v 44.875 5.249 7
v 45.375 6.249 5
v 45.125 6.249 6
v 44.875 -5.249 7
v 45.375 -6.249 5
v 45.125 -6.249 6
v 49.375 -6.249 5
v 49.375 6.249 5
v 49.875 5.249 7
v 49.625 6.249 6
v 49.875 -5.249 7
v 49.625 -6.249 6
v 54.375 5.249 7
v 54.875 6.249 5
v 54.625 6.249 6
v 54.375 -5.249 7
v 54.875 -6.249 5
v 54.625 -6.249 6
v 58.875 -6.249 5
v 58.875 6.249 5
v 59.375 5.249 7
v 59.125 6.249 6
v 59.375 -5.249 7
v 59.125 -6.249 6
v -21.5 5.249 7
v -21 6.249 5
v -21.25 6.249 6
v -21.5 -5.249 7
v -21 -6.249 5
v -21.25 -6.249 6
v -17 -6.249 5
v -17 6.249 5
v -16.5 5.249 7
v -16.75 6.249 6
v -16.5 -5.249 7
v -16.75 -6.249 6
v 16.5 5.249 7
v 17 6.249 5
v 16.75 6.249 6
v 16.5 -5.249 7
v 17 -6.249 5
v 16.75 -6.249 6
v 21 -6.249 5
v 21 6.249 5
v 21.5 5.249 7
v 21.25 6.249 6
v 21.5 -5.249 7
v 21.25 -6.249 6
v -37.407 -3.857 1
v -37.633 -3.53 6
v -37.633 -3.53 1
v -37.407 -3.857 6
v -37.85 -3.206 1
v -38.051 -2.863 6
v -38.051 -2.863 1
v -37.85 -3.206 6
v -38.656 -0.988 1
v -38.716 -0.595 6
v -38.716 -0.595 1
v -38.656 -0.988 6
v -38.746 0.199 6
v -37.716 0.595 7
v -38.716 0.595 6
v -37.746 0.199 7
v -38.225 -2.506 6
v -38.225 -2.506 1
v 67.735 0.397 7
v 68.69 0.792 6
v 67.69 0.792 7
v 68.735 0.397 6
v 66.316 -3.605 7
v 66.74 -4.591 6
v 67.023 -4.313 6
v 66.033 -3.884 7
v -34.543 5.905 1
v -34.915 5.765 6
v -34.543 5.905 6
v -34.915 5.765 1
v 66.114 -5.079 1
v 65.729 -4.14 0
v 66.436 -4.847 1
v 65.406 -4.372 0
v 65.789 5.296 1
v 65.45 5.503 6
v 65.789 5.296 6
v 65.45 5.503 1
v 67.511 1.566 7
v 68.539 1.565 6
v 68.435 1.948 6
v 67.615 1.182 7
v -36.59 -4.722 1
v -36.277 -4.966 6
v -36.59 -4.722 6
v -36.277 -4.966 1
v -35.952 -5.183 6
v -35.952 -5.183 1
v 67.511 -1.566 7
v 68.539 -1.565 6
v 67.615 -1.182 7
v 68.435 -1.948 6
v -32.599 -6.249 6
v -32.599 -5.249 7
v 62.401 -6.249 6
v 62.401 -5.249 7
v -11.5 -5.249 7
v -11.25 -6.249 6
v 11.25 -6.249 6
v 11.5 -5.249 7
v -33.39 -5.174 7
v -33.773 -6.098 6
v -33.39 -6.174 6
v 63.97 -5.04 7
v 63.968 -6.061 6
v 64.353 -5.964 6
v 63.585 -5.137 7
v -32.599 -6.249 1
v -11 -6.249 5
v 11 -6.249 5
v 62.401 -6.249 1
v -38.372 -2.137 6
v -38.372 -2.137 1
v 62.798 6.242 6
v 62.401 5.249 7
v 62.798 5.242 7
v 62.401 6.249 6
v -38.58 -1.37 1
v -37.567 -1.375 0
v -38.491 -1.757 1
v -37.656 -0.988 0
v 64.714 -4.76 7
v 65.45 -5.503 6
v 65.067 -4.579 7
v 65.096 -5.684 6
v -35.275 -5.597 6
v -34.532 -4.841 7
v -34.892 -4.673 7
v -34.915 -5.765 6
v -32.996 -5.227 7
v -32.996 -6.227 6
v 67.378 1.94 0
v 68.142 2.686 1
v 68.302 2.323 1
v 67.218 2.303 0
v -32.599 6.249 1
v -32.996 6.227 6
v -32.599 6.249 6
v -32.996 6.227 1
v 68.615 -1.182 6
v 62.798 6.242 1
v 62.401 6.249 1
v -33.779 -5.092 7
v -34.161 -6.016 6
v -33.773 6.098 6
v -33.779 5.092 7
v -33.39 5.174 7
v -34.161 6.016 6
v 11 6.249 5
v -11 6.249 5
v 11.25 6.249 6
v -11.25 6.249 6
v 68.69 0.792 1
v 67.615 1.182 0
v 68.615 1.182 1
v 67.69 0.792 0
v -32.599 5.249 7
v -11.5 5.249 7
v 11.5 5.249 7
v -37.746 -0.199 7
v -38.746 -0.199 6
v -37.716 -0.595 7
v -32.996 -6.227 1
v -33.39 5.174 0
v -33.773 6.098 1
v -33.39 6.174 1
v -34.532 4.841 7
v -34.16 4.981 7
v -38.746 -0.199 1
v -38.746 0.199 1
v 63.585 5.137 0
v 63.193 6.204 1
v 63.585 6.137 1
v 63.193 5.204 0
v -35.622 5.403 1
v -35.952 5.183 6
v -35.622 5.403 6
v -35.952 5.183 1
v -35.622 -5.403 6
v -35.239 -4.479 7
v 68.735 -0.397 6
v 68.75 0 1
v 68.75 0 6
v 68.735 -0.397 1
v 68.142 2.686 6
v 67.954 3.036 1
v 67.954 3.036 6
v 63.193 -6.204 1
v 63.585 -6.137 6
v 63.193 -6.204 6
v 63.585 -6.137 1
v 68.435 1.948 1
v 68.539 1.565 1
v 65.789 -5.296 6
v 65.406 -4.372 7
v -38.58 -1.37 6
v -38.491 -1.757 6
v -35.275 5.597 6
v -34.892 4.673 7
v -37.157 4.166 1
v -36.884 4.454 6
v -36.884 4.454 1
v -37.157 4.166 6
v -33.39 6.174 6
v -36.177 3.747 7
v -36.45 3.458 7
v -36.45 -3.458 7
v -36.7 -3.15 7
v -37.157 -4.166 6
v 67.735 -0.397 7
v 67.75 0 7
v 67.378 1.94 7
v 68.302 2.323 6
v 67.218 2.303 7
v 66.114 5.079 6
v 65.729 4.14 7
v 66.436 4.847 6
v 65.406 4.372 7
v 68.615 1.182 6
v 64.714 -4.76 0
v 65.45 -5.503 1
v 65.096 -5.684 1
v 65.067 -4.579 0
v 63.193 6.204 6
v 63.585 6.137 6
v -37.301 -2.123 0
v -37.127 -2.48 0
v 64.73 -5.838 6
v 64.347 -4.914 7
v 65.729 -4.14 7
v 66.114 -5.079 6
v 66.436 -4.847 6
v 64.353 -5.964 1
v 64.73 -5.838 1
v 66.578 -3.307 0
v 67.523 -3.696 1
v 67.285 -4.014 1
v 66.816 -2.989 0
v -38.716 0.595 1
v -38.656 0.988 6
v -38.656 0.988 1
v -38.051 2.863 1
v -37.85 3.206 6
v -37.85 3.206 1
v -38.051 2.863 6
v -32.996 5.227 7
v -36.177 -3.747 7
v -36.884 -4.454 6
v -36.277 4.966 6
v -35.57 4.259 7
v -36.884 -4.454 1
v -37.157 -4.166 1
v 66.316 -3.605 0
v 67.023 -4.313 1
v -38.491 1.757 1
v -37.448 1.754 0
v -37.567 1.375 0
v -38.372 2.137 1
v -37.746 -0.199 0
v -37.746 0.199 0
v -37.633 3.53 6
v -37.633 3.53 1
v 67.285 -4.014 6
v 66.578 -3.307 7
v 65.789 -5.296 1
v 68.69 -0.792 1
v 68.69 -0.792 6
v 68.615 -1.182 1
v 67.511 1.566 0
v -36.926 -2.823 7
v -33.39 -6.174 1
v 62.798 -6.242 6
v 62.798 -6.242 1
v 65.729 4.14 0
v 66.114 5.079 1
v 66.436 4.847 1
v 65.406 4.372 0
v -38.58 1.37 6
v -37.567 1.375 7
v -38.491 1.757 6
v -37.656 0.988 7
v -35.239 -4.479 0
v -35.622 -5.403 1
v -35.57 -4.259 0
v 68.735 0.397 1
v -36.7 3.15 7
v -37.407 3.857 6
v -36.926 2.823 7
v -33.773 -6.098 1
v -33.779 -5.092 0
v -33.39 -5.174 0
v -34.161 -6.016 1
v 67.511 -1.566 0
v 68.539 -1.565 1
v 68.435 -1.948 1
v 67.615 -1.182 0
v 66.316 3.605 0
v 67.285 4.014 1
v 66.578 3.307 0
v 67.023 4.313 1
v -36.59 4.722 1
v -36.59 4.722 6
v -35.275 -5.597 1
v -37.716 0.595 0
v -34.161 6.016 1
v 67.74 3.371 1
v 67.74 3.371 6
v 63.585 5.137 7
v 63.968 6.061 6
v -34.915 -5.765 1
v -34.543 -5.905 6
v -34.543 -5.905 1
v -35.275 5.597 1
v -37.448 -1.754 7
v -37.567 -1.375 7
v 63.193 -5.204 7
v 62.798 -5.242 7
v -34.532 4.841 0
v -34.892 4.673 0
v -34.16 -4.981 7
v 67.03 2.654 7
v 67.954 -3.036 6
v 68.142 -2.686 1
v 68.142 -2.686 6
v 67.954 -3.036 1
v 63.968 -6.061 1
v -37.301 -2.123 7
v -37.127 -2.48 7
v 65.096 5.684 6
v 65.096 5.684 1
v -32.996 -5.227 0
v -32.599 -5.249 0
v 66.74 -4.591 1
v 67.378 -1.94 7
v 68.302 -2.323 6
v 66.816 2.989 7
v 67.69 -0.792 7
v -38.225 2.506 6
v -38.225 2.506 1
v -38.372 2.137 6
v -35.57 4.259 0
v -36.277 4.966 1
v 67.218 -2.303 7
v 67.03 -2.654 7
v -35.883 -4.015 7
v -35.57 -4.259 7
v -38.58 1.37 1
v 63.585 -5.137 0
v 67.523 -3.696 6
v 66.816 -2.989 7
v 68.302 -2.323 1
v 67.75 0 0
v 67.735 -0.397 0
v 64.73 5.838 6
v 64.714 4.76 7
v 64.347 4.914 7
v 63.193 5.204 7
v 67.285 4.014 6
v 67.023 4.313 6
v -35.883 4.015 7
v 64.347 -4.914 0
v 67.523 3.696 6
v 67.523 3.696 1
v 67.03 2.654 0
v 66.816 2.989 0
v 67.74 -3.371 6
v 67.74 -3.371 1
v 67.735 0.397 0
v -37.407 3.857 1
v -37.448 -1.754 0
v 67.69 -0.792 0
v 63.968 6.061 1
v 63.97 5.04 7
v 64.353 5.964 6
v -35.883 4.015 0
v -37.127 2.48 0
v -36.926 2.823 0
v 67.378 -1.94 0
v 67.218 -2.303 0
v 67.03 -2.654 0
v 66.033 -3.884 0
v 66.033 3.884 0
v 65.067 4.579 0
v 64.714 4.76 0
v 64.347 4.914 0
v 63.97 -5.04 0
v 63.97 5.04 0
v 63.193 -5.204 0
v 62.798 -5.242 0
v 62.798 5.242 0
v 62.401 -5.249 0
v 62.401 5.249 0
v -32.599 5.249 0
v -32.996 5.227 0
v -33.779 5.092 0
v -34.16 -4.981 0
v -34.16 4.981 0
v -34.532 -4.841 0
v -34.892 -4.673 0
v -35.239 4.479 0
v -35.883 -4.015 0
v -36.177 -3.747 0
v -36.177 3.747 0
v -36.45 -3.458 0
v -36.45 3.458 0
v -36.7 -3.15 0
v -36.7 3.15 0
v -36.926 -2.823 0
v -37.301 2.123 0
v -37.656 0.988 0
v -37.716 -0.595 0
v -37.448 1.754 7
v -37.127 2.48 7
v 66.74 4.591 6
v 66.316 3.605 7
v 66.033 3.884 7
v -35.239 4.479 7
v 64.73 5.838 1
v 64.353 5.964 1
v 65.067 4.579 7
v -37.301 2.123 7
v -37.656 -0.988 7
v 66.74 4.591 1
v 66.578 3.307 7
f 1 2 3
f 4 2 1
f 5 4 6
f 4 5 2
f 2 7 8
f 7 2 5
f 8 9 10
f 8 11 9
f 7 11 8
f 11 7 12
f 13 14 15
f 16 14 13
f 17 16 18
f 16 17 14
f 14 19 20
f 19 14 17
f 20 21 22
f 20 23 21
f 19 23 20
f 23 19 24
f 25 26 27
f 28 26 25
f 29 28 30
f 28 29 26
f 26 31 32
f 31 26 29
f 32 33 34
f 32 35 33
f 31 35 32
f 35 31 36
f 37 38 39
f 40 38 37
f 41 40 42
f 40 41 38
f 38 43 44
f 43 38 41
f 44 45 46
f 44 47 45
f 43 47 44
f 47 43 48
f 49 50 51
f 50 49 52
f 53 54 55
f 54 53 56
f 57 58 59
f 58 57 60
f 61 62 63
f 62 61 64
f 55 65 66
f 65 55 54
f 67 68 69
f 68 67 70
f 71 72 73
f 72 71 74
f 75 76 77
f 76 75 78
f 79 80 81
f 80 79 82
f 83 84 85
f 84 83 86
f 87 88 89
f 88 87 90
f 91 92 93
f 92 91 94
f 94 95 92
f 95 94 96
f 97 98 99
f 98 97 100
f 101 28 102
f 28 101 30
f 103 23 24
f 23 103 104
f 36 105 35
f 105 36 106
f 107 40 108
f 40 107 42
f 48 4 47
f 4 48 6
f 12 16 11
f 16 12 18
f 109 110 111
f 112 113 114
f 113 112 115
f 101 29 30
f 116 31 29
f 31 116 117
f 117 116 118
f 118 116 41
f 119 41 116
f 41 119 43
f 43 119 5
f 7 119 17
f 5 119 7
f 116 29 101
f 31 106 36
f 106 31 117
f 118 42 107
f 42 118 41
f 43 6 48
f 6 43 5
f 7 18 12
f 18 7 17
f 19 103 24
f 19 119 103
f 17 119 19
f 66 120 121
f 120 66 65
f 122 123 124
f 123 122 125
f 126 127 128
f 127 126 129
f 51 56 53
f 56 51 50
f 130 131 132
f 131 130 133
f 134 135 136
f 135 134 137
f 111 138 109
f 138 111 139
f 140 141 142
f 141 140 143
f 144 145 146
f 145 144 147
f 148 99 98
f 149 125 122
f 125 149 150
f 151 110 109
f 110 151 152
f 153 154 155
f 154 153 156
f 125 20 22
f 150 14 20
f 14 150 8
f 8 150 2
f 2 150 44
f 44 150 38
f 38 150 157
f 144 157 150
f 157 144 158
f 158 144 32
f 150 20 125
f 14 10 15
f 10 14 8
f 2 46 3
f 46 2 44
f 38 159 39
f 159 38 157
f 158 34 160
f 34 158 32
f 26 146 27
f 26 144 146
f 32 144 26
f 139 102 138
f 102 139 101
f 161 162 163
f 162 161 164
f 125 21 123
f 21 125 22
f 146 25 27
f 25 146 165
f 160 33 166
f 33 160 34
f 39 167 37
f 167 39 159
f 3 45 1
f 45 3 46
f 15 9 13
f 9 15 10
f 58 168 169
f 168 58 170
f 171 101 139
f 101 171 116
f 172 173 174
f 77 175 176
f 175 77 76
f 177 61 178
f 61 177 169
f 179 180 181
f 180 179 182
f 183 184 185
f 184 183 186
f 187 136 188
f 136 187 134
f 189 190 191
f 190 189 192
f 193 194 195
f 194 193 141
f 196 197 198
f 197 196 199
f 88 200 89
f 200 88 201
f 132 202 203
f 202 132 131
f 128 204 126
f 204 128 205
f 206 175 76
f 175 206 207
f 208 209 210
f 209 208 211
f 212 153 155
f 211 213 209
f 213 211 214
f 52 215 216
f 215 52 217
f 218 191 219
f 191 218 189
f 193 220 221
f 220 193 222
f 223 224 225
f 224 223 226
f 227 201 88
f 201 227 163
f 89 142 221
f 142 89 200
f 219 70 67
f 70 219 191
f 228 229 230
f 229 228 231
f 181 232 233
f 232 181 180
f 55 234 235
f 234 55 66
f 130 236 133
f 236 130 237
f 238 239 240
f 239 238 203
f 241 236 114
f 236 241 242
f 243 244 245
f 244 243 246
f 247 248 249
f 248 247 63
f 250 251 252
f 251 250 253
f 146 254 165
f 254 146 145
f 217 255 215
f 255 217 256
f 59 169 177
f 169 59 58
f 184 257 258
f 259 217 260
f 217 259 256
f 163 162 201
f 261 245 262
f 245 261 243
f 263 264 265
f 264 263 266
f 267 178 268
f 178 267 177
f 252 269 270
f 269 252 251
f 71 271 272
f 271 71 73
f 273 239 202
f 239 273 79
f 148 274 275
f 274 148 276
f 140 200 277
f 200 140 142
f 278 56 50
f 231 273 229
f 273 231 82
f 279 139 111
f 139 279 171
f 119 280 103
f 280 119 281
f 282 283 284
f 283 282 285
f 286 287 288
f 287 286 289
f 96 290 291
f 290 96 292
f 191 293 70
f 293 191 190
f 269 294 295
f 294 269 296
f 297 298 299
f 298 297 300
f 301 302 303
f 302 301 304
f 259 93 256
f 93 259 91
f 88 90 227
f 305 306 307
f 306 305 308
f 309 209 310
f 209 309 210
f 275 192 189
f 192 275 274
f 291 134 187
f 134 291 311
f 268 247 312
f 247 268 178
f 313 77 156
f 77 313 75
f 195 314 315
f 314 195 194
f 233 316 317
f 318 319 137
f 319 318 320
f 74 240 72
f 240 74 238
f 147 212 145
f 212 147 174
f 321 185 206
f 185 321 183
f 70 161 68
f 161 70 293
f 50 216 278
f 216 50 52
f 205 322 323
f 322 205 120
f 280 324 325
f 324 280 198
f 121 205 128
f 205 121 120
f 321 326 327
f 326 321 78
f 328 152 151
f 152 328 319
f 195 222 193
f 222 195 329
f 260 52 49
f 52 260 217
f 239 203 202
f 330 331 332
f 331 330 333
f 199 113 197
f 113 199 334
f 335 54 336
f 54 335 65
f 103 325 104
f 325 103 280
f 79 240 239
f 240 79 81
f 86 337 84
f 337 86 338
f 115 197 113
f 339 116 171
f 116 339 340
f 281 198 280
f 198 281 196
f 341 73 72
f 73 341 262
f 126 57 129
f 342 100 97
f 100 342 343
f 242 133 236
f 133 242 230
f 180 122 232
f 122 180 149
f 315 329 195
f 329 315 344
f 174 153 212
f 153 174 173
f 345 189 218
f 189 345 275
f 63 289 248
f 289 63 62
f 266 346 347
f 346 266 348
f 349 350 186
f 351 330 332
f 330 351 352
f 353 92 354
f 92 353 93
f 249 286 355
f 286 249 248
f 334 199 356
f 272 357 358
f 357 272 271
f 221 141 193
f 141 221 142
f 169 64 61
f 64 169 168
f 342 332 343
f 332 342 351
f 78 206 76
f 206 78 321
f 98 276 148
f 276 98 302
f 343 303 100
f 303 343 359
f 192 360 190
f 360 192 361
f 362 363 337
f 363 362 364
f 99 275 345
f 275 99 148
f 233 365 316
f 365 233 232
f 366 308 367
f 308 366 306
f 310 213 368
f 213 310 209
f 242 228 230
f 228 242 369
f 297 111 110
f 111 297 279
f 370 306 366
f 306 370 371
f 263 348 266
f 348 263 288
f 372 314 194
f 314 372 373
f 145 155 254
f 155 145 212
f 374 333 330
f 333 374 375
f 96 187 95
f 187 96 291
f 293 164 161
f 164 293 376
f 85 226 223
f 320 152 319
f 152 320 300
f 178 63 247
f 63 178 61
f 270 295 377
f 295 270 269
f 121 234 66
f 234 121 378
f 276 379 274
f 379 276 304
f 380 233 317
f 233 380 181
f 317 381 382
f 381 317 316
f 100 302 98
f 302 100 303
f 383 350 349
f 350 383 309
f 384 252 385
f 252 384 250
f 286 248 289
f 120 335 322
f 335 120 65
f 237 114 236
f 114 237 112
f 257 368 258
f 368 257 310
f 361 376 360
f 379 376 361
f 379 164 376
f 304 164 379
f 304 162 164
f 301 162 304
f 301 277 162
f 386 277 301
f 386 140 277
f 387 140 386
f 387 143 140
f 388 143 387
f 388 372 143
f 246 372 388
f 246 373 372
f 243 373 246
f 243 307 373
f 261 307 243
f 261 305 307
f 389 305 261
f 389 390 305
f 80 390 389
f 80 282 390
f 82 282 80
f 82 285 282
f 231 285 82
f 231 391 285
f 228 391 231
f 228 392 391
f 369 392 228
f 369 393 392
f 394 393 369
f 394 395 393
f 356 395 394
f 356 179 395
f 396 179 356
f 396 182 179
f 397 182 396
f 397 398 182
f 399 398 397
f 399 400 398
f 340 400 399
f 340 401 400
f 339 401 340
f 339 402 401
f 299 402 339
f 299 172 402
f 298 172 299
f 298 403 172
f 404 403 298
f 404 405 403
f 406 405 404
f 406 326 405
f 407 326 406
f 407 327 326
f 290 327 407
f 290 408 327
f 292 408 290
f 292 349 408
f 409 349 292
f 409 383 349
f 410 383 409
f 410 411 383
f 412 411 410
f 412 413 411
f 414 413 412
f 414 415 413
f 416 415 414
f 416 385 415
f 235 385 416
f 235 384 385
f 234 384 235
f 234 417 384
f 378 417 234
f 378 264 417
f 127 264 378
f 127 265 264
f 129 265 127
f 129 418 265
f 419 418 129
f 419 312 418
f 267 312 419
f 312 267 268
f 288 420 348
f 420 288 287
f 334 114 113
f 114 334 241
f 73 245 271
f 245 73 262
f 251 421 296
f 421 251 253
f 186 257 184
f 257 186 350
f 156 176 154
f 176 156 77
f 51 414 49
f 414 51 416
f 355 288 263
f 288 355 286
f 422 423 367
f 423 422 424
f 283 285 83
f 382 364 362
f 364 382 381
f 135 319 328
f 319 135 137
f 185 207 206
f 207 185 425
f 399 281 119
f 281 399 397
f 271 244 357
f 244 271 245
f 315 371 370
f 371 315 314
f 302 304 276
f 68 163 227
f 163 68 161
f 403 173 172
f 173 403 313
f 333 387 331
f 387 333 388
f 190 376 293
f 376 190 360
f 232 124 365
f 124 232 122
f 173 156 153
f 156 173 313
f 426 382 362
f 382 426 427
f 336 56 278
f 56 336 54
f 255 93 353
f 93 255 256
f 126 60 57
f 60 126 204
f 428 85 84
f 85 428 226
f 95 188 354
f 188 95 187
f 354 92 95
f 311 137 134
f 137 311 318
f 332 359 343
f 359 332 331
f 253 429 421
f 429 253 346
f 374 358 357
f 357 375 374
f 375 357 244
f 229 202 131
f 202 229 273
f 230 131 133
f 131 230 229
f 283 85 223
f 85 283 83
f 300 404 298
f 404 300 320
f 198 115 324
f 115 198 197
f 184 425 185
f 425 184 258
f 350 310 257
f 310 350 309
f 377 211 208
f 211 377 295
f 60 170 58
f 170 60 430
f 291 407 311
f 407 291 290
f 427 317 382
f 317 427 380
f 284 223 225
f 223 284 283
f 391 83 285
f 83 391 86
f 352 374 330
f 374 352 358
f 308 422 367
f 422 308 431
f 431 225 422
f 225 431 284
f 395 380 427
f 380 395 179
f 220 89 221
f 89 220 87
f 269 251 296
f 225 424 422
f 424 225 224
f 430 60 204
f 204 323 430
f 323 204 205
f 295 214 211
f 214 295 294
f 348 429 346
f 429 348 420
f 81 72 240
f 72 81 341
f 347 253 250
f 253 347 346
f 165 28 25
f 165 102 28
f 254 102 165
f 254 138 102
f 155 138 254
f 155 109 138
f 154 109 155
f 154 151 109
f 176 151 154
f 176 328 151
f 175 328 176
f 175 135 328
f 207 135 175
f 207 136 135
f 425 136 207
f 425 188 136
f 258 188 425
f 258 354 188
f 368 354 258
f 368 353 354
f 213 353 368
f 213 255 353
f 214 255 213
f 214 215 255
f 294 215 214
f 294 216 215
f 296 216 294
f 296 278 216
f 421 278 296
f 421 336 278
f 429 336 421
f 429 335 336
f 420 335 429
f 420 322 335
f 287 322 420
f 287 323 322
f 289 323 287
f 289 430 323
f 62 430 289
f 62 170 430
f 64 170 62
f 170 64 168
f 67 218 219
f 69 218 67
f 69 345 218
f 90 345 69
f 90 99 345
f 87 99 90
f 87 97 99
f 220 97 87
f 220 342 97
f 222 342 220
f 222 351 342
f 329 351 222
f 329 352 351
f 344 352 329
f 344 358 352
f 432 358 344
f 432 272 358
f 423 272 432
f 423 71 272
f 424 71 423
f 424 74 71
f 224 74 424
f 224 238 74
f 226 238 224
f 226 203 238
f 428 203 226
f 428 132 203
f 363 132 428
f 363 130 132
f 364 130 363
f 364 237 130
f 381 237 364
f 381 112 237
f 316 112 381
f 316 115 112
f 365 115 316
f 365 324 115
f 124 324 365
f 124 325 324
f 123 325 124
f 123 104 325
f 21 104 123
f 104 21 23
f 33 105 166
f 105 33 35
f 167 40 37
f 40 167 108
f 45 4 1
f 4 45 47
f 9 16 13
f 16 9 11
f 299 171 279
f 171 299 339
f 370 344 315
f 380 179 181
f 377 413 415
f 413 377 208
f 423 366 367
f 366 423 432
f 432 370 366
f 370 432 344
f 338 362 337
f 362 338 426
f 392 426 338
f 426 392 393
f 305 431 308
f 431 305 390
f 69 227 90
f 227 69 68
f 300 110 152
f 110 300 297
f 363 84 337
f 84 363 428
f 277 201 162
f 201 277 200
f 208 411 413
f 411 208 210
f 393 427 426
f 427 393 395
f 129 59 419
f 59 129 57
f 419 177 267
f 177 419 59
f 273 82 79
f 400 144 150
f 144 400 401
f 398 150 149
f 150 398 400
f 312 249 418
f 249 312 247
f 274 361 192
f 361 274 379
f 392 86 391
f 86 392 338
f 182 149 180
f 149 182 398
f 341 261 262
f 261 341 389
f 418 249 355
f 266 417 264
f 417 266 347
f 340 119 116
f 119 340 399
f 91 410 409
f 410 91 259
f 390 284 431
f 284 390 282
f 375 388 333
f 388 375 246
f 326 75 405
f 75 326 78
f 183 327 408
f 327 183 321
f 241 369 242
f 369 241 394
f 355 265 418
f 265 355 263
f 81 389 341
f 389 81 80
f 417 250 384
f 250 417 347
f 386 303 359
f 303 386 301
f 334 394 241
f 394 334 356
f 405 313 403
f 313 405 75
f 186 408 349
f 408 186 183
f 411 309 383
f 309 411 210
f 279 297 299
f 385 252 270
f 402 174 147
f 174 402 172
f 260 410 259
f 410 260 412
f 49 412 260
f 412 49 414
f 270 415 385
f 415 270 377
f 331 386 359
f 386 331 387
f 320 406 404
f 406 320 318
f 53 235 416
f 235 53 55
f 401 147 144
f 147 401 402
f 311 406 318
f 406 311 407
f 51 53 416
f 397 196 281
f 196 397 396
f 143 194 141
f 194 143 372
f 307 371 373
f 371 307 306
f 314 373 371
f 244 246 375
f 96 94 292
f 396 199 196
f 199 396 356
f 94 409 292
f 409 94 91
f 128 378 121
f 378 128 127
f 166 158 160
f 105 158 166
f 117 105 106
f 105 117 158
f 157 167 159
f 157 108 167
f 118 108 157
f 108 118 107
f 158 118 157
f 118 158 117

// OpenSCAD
/*
 * Bicycle bottle cage mount riser
 * By smkent (GitHub) / bulbasaur0 (Printables)
 *
 * Licensed under Creative Commons (4.0 International License) Attribution-ShareAlike
 */

/* [Model Options] */
Zip_Ties = true;
Velcro = true;

/* [Size] */
Extension = 30; // [0:1:100]
Screw_Play = 1; // [0:1:8]
Thickness = 7; // [5:1:20]
Round_Radius = 1; // [0:0.1:2]

/* [Advanced Options] */

/* [Development Toggles] */

module __end_customizer_options__() { }

// Functions //

function vec_add(vector, add) = [for (v = vector) v + add];

// Constants //

zip_len = 4;
velcro_len = 22;
screw_spacing = 64;
riser_d = 12.5;
thick = Thickness;
slot_depth = 2;
zip_count = floor(Extension / (zip_len * 3));
rr = Round_Radius;
slop = 0.001;

$fa = $preview ? $fa : 2;
$fs = $preview ? $fs : 0.4;

// Modules //

module at_screws() {
    translate([-screw_spacing / 2, 0, 0])
    for (ox = [0, screw_spacing])
    translate([ox, 0, 0])
    children();
}

module at_ends() {
    at_screws()
    children();
    if (Extension) {
        translate([screw_spacing / 2 + Extension, 0])
        children();
    }
}

module screw_play() {
    hull()
    for (tx = [-0.5, 0.5])
    translate([tx * Screw_Play, 0, 0])
    children();
}

module round_3d(radius = rr) {
    if (radius == 0) {
        children();
    } else {
        render()
        minkowski() {
            children();
            for (mz = [0, 1])
            mirror([0, 0, mz])
            cylinder(r1=radius, r2=0, h=radius);
        }
    }
}

module slot(length) {
    translate([0, 0, thick - slot_depth])
    hull() {
        linear_extrude(height=slop)
        square([length, riser_d + slop * 2], center=true);
        translate([0, 0, slot_depth])
        linear_extrude(height=slop)
        square([length + slot_depth / 2, riser_d + slop * 2], center=true);
    }
}

module tie_slot() {
    slot(velcro_len);
}

module zip_slot() {
    slot(zip_len);
}

module zip_slots() {
    start_x = riser_d + zip_len * 2;
    space = Extension - start_x;
    translate([start_x * 0.75, 0, 0])
    for (i = [0:space / (zip_count - 1):space]) {
        translate([i, 0, 0])
        zip_slot();
    }
}

module slots() {
    difference() {
        children();
        if (Velcro)
        tie_slot();
        if (Zip_Ties) {
            if (Extension > zip_len * (zip_count + 1))
            translate([screw_spacing / 2, 0, 0])
            zip_slots();
            for (tx = [-0.5, 0.5])
            translate([tx * (zip_len * 4 + velcro_len), 0, 0])
            zip_slot();
        }
    }
}

module body() {
    translate([0, 0, rr])
    linear_extrude(height=thick - rr * 2)
    hull() {
        at_ends()
        screw_play()
        circle(d=riser_d - rr * 2);
    }
}

module riser() {
    render() {
        slots()
        round_3d()
        body();
    }
}

module main() {
    color("lemonchiffon", 0.8)
    riser();
}

main();
